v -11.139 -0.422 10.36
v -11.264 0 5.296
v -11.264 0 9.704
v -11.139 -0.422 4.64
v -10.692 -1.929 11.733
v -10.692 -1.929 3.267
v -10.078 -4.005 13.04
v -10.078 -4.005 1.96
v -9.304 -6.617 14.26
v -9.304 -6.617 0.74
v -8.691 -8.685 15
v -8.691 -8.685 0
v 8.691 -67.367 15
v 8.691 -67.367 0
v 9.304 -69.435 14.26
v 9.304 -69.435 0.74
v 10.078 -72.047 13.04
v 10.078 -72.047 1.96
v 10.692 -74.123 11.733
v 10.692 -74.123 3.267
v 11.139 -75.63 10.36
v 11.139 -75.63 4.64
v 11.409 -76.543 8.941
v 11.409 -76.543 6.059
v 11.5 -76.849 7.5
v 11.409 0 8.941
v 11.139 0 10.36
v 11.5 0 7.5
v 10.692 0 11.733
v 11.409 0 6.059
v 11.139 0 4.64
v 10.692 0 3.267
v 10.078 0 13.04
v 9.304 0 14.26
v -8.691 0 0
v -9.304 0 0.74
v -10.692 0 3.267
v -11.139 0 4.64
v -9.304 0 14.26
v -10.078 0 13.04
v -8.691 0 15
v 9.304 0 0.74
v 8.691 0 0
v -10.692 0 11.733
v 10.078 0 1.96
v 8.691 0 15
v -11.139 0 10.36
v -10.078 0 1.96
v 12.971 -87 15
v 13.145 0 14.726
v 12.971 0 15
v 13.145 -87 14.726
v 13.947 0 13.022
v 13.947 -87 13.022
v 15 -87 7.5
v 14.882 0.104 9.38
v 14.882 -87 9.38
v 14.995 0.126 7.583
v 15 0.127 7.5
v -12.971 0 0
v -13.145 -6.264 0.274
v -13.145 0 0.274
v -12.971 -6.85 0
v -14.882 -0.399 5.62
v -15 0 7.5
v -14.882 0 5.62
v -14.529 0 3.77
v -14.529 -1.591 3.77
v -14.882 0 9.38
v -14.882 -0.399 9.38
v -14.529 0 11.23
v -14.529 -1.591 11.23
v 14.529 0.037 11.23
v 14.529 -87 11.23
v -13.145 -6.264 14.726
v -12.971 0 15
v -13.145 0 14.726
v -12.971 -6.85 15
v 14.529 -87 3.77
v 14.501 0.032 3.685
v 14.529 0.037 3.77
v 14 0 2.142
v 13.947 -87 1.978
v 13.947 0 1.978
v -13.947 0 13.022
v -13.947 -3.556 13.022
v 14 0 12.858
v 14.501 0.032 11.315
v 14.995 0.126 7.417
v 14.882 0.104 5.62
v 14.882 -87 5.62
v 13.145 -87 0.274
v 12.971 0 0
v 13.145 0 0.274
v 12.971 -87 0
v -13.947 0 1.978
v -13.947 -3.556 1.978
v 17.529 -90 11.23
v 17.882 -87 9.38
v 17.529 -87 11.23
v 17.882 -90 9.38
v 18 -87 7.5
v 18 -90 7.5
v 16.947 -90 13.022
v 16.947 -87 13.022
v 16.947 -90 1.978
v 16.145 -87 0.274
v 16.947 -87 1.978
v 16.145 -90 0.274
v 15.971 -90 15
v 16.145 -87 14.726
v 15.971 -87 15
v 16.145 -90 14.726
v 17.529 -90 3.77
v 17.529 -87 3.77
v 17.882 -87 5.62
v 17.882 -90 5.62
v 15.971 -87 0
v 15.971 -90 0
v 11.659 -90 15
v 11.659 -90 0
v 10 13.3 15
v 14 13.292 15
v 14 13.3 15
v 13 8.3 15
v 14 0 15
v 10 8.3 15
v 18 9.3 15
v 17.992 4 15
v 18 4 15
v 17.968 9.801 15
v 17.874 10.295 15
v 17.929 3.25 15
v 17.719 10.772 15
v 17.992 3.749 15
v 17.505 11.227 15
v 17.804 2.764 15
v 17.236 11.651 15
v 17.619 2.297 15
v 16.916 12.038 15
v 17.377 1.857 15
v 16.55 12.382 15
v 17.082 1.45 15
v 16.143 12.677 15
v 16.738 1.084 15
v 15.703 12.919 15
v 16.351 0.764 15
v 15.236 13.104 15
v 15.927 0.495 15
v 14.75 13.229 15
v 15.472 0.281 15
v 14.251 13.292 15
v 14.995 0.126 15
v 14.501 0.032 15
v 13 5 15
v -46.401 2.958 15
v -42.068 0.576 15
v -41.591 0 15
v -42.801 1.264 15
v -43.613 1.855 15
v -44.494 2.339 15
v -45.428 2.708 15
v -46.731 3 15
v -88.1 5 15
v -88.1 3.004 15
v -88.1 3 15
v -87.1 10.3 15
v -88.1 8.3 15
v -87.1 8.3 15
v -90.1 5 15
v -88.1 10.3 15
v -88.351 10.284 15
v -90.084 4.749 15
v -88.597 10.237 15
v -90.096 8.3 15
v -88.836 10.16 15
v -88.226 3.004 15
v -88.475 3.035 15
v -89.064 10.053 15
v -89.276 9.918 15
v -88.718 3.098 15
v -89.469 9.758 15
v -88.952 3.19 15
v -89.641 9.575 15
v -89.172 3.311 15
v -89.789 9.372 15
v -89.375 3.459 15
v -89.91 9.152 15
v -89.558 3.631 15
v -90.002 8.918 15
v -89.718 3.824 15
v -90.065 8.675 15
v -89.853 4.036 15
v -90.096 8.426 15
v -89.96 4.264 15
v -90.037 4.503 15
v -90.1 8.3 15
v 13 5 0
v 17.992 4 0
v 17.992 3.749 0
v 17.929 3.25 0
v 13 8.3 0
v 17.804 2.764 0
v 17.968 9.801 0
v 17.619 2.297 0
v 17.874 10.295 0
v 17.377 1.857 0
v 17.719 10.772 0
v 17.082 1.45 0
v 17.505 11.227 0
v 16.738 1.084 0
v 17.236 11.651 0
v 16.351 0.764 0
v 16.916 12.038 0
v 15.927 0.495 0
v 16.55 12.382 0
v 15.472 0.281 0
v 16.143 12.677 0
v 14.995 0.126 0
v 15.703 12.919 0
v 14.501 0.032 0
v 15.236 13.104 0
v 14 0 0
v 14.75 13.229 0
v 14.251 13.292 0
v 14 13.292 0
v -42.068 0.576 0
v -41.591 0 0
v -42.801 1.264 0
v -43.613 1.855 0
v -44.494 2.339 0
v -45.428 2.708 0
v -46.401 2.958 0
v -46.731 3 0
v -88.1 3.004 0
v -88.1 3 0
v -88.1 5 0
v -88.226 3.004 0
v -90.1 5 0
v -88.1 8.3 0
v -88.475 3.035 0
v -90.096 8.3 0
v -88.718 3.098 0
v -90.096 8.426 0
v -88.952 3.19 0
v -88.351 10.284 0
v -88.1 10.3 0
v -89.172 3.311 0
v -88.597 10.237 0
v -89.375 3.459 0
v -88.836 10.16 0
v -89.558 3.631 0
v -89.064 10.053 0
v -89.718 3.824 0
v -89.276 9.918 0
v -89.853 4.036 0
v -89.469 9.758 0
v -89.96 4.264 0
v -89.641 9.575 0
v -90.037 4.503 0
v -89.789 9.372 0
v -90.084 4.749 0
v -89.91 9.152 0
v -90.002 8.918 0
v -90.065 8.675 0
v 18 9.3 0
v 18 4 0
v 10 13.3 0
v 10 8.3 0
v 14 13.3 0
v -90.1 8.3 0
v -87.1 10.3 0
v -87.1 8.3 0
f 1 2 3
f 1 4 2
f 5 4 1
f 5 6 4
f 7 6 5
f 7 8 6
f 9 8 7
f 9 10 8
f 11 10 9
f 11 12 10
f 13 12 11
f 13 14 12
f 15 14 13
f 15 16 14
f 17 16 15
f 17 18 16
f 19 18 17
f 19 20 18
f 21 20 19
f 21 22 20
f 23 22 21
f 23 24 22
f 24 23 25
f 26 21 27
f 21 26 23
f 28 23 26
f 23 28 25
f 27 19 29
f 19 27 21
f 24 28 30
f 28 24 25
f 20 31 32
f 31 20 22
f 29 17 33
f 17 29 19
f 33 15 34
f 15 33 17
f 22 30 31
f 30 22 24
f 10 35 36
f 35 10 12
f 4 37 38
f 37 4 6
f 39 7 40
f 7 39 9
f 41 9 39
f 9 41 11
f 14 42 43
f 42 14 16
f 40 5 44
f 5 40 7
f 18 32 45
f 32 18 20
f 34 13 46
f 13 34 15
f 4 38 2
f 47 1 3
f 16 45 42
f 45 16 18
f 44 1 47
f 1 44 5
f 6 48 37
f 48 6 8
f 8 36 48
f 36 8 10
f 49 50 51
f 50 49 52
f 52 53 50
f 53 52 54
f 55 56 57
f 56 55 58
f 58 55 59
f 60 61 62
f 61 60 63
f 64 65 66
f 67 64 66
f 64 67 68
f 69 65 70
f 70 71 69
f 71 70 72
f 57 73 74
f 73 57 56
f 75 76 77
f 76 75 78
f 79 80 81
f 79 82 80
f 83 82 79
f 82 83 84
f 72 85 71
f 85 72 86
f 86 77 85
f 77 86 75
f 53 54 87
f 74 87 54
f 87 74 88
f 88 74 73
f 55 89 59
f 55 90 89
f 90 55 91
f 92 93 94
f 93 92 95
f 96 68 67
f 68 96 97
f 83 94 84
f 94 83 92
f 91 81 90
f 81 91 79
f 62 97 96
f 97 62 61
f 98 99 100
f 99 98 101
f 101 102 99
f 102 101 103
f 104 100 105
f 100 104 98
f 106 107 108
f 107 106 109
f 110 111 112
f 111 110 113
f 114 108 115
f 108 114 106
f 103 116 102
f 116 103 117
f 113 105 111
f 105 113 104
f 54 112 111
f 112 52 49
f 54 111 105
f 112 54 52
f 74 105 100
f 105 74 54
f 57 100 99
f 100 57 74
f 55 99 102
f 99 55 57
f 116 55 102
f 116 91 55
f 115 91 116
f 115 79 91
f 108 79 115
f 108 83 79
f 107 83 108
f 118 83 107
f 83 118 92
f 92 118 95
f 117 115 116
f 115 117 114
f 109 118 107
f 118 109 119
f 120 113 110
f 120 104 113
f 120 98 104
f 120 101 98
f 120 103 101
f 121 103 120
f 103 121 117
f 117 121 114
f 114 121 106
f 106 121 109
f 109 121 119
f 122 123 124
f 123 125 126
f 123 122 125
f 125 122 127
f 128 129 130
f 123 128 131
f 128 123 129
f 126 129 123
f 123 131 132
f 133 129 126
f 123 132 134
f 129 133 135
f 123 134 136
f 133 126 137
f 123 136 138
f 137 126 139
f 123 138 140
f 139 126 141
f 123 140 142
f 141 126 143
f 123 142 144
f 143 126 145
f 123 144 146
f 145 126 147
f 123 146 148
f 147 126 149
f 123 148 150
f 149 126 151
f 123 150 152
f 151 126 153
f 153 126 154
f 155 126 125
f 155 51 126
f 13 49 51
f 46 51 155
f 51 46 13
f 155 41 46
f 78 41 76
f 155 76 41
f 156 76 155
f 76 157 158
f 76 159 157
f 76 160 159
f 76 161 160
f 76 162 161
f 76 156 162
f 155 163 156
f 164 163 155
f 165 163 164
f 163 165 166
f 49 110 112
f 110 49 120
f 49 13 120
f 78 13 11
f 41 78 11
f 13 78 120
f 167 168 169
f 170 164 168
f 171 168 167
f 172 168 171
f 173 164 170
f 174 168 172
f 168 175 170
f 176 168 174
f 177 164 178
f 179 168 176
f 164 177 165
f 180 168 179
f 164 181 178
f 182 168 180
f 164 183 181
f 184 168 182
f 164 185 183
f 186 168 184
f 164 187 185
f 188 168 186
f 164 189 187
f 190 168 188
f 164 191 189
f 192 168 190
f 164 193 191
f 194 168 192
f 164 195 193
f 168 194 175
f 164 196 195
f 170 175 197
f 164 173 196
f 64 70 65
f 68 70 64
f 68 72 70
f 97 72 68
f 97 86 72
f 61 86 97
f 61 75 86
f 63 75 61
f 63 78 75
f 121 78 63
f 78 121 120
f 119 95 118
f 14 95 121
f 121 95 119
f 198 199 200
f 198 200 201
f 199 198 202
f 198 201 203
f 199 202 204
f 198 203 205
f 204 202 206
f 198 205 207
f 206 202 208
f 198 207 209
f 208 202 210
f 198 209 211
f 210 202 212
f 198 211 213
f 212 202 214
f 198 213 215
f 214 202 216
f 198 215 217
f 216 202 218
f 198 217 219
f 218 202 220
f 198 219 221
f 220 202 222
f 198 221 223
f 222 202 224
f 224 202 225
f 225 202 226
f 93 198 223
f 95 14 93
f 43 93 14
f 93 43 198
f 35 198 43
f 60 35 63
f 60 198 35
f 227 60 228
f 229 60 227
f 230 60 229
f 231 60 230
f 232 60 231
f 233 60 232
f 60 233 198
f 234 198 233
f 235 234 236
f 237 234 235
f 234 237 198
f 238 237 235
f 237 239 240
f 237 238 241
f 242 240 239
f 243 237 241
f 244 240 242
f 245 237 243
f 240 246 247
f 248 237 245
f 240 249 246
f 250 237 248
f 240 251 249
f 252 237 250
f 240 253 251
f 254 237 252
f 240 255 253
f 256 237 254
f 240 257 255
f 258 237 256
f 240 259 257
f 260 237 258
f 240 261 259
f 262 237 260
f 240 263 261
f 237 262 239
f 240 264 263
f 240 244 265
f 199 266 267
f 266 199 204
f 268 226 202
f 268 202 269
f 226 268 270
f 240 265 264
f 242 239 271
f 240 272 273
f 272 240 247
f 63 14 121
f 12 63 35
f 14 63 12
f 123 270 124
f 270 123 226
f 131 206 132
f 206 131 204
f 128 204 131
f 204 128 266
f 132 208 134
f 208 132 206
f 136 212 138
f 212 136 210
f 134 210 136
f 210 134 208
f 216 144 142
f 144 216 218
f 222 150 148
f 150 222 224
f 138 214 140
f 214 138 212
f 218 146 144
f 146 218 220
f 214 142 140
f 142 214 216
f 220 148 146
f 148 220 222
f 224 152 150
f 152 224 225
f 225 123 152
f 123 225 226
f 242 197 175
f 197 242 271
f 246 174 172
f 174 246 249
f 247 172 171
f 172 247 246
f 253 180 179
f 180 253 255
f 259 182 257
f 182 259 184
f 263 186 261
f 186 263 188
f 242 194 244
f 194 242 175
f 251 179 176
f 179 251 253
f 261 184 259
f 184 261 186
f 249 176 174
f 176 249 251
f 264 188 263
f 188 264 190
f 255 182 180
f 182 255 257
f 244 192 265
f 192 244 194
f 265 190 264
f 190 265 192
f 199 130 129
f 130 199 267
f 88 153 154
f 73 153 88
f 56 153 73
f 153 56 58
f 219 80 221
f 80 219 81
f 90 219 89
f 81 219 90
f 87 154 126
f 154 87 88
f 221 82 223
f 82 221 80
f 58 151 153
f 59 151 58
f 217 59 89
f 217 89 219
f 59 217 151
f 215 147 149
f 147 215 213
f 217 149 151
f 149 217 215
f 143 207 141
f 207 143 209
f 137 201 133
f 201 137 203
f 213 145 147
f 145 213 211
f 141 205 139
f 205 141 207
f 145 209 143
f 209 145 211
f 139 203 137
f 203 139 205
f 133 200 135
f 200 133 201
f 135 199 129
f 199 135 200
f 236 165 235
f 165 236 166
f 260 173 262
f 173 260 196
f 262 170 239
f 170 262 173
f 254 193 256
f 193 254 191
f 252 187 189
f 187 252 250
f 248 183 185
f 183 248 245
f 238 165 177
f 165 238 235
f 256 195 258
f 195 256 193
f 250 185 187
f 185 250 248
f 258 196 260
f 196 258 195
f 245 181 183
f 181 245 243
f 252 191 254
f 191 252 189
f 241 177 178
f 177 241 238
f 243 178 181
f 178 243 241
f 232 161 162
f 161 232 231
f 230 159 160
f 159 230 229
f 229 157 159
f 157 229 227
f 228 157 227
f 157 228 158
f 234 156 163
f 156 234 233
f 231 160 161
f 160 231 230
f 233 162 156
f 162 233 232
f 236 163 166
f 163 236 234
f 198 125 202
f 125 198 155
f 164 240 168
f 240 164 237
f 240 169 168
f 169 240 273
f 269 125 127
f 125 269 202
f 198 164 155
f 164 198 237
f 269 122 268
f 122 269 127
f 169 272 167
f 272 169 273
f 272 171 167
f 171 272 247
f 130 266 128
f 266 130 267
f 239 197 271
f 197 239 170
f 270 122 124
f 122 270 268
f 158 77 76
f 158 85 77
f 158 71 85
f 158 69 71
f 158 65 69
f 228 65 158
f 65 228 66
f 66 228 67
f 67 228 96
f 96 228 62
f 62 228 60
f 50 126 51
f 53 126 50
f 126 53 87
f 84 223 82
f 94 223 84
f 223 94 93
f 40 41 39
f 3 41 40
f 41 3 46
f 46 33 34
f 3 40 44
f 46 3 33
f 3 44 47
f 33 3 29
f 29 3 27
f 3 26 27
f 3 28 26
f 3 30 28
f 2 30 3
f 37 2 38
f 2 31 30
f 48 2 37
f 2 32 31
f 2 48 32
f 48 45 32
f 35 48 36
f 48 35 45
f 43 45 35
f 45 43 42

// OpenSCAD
// [FL_INDEX: keywords="openscad, 3d_parametric, Fully_printable_spoolholder, csg_solid" | COT="Parametric OpenSCAD design from 3DCodeverse"]
// Title: Fully printable spoolholder

/* [Main] */
// What's the height of the gantry the holder needs to grip around? (add ~1mm to compensate shrinkage)
gantryHeight = 101.1;

// What's the thickness of the gantry the holder needs to grip aroud?
gantryThickness = 3.3;

// What is the minimum internal radius of the roll of filament?
rollRadius = 15; // [10:50]

// How much bigger spool radius do you also want to accomodate?
spoolRadiusMargin = 20; // [0:50]

// What's the width of the fillament spool?
spoolWidth = 87; //[50:200]

/* [Extra] */
// Height of the notch at the end of the holder
spoolNotch = 3; //[1:10]

// Angle of the bottom arm of the spoolholder (set this so that the end aligns)
spoolAngle = 16.5; //[5:50]

// Thickness of the spoolholder arms
spoolHolderThickness = 3.5;//[1,1.5,2,2.5,3,3.5,4,4.5,5,5.5,6,6.5,7,7.5,8,8.5,9,9.5,10]

// Thickness of the top vertical part of the holder
baseThickness = 5; //[2:10]

// Thickness of the bottom vertical part of the holder
baseThicknessBottom = 2; //[1:10]

// How much should the top wrap around?
baseNotchTop = 3; //[1:10]

// How much should the bottom wrap around? (don't make this to high, otherwise it'll be hard to snap the holder on)
baseNotchBottom = 1; //[1:5]

// How round should the corners be?
cornerRadius = 4; //[0:10]


$fn =50;


module hook() {
	translate([0,0,rollRadius/2])	rotate([90,0,0]) intersection() {
		translate([-rollRadius,-rollRadius/2,0]) rotate([0,spoolAngle,0]) cube([spoolWidth/2,rollRadius, spoolWidth*1.2]);
		union() {
			difference() {
				translate([0,0,-1]) cylinder(spoolWidth+2,rollRadius, rollRadius);
				intersection() {    // make the holder hollow, for less printing
					rotate([0,spoolAngle,0]) translate([-rollRadius+spoolHolderThickness*1.2,-rollRadius/2-1,-10]) 
						cube([spoolWidth/2,rollRadius*2, spoolWidth*1.2]);
					translate([0,0,-2]) cylinder(spoolWidth + 2, rollRadius-spoolHolderThickness, rollRadius-spoolHolderThickness);
				}
			}
			translate([spoolNotch,0,spoolWidth]) cylinder(spoolNotch, rollRadius, rollRadius);
		}
	}
}

module rounding(height, radius = 3) {
	height = height + 0.04;
	translate([0,0,-0.02]) difference() {
		cube([radius+0.02, radius+0.02, height]);
		cylinder(height, radius, radius);
	}
}



module base() {
	cubeX = gantryHeight + baseThickness + baseThicknessBottom;
	cubeY = gantryThickness + baseThickness * 2;
	cubeZ = rollRadius;

	translate([-cubeX+rollRadius+spoolNotch,0,0]) {
		difference() {
			cube([cubeX, cubeY, cubeZ]);
			union() {
				// rounded corners
				translate([cubeX-cornerRadius, cubeY-cornerRadius,0]) rounding(cubeZ, cornerRadius);
				translate([cornerRadius/2, cubeY-cornerRadius/2-baseThickness+baseThicknessBottom, 0]) rotate([0,0,90]) 
					rounding(cubeZ, cornerRadius/2);
				translate([cubeX-cornerRadius, cornerRadius, 0]) rotate([0,0,-90]) rounding(cubeZ, cornerRadius);
				translate([cornerRadius/2, cornerRadius/2+baseThickness-baseThicknessBottom, 0]) rotate([0,0,180]) 
					rounding(cubeZ, cornerRadius/2);

				// space for the gantry
				translate([baseThicknessBottom, baseThickness, -0.1]) cube([gantryHeight, gantryThickness, cubeZ+0.2]);
				translate([baseThicknessBottom+baseNotchBottom, baseThickness+gantryThickness-0.1, -0.1])
					cube([gantryHeight-baseNotchTop-baseNotchBottom, baseThickness+0.2, cubeZ+0.2]);

				// making the bottom part skinnier
				difference() {
					translate([-0.1,-0.1,-0.1]) 
						cube([cubeX-spoolNotch-rollRadius-spoolRadiusMargin*2+0.1, baseThickness-baseThicknessBottom+0.1, cubeZ+0.2]);
					translate([cubeX-spoolNotch-rollRadius-spoolRadiusMargin*2-cornerRadius*2+0.1,
								 baseThickness-baseThicknessBottom-cornerRadius*2+0.1, -0.1]) 
						rounding(cubeZ+0.2, cornerRadius*2);
				}
				translate([-0.1, baseThickness+baseThicknessBottom+gantryThickness,-0.1]) 
					cube([baseThickness+baseNotchBottom+0.2, baseThickness, cubeZ+0.2]);
			}
		}
	}
}

hook();
base();
